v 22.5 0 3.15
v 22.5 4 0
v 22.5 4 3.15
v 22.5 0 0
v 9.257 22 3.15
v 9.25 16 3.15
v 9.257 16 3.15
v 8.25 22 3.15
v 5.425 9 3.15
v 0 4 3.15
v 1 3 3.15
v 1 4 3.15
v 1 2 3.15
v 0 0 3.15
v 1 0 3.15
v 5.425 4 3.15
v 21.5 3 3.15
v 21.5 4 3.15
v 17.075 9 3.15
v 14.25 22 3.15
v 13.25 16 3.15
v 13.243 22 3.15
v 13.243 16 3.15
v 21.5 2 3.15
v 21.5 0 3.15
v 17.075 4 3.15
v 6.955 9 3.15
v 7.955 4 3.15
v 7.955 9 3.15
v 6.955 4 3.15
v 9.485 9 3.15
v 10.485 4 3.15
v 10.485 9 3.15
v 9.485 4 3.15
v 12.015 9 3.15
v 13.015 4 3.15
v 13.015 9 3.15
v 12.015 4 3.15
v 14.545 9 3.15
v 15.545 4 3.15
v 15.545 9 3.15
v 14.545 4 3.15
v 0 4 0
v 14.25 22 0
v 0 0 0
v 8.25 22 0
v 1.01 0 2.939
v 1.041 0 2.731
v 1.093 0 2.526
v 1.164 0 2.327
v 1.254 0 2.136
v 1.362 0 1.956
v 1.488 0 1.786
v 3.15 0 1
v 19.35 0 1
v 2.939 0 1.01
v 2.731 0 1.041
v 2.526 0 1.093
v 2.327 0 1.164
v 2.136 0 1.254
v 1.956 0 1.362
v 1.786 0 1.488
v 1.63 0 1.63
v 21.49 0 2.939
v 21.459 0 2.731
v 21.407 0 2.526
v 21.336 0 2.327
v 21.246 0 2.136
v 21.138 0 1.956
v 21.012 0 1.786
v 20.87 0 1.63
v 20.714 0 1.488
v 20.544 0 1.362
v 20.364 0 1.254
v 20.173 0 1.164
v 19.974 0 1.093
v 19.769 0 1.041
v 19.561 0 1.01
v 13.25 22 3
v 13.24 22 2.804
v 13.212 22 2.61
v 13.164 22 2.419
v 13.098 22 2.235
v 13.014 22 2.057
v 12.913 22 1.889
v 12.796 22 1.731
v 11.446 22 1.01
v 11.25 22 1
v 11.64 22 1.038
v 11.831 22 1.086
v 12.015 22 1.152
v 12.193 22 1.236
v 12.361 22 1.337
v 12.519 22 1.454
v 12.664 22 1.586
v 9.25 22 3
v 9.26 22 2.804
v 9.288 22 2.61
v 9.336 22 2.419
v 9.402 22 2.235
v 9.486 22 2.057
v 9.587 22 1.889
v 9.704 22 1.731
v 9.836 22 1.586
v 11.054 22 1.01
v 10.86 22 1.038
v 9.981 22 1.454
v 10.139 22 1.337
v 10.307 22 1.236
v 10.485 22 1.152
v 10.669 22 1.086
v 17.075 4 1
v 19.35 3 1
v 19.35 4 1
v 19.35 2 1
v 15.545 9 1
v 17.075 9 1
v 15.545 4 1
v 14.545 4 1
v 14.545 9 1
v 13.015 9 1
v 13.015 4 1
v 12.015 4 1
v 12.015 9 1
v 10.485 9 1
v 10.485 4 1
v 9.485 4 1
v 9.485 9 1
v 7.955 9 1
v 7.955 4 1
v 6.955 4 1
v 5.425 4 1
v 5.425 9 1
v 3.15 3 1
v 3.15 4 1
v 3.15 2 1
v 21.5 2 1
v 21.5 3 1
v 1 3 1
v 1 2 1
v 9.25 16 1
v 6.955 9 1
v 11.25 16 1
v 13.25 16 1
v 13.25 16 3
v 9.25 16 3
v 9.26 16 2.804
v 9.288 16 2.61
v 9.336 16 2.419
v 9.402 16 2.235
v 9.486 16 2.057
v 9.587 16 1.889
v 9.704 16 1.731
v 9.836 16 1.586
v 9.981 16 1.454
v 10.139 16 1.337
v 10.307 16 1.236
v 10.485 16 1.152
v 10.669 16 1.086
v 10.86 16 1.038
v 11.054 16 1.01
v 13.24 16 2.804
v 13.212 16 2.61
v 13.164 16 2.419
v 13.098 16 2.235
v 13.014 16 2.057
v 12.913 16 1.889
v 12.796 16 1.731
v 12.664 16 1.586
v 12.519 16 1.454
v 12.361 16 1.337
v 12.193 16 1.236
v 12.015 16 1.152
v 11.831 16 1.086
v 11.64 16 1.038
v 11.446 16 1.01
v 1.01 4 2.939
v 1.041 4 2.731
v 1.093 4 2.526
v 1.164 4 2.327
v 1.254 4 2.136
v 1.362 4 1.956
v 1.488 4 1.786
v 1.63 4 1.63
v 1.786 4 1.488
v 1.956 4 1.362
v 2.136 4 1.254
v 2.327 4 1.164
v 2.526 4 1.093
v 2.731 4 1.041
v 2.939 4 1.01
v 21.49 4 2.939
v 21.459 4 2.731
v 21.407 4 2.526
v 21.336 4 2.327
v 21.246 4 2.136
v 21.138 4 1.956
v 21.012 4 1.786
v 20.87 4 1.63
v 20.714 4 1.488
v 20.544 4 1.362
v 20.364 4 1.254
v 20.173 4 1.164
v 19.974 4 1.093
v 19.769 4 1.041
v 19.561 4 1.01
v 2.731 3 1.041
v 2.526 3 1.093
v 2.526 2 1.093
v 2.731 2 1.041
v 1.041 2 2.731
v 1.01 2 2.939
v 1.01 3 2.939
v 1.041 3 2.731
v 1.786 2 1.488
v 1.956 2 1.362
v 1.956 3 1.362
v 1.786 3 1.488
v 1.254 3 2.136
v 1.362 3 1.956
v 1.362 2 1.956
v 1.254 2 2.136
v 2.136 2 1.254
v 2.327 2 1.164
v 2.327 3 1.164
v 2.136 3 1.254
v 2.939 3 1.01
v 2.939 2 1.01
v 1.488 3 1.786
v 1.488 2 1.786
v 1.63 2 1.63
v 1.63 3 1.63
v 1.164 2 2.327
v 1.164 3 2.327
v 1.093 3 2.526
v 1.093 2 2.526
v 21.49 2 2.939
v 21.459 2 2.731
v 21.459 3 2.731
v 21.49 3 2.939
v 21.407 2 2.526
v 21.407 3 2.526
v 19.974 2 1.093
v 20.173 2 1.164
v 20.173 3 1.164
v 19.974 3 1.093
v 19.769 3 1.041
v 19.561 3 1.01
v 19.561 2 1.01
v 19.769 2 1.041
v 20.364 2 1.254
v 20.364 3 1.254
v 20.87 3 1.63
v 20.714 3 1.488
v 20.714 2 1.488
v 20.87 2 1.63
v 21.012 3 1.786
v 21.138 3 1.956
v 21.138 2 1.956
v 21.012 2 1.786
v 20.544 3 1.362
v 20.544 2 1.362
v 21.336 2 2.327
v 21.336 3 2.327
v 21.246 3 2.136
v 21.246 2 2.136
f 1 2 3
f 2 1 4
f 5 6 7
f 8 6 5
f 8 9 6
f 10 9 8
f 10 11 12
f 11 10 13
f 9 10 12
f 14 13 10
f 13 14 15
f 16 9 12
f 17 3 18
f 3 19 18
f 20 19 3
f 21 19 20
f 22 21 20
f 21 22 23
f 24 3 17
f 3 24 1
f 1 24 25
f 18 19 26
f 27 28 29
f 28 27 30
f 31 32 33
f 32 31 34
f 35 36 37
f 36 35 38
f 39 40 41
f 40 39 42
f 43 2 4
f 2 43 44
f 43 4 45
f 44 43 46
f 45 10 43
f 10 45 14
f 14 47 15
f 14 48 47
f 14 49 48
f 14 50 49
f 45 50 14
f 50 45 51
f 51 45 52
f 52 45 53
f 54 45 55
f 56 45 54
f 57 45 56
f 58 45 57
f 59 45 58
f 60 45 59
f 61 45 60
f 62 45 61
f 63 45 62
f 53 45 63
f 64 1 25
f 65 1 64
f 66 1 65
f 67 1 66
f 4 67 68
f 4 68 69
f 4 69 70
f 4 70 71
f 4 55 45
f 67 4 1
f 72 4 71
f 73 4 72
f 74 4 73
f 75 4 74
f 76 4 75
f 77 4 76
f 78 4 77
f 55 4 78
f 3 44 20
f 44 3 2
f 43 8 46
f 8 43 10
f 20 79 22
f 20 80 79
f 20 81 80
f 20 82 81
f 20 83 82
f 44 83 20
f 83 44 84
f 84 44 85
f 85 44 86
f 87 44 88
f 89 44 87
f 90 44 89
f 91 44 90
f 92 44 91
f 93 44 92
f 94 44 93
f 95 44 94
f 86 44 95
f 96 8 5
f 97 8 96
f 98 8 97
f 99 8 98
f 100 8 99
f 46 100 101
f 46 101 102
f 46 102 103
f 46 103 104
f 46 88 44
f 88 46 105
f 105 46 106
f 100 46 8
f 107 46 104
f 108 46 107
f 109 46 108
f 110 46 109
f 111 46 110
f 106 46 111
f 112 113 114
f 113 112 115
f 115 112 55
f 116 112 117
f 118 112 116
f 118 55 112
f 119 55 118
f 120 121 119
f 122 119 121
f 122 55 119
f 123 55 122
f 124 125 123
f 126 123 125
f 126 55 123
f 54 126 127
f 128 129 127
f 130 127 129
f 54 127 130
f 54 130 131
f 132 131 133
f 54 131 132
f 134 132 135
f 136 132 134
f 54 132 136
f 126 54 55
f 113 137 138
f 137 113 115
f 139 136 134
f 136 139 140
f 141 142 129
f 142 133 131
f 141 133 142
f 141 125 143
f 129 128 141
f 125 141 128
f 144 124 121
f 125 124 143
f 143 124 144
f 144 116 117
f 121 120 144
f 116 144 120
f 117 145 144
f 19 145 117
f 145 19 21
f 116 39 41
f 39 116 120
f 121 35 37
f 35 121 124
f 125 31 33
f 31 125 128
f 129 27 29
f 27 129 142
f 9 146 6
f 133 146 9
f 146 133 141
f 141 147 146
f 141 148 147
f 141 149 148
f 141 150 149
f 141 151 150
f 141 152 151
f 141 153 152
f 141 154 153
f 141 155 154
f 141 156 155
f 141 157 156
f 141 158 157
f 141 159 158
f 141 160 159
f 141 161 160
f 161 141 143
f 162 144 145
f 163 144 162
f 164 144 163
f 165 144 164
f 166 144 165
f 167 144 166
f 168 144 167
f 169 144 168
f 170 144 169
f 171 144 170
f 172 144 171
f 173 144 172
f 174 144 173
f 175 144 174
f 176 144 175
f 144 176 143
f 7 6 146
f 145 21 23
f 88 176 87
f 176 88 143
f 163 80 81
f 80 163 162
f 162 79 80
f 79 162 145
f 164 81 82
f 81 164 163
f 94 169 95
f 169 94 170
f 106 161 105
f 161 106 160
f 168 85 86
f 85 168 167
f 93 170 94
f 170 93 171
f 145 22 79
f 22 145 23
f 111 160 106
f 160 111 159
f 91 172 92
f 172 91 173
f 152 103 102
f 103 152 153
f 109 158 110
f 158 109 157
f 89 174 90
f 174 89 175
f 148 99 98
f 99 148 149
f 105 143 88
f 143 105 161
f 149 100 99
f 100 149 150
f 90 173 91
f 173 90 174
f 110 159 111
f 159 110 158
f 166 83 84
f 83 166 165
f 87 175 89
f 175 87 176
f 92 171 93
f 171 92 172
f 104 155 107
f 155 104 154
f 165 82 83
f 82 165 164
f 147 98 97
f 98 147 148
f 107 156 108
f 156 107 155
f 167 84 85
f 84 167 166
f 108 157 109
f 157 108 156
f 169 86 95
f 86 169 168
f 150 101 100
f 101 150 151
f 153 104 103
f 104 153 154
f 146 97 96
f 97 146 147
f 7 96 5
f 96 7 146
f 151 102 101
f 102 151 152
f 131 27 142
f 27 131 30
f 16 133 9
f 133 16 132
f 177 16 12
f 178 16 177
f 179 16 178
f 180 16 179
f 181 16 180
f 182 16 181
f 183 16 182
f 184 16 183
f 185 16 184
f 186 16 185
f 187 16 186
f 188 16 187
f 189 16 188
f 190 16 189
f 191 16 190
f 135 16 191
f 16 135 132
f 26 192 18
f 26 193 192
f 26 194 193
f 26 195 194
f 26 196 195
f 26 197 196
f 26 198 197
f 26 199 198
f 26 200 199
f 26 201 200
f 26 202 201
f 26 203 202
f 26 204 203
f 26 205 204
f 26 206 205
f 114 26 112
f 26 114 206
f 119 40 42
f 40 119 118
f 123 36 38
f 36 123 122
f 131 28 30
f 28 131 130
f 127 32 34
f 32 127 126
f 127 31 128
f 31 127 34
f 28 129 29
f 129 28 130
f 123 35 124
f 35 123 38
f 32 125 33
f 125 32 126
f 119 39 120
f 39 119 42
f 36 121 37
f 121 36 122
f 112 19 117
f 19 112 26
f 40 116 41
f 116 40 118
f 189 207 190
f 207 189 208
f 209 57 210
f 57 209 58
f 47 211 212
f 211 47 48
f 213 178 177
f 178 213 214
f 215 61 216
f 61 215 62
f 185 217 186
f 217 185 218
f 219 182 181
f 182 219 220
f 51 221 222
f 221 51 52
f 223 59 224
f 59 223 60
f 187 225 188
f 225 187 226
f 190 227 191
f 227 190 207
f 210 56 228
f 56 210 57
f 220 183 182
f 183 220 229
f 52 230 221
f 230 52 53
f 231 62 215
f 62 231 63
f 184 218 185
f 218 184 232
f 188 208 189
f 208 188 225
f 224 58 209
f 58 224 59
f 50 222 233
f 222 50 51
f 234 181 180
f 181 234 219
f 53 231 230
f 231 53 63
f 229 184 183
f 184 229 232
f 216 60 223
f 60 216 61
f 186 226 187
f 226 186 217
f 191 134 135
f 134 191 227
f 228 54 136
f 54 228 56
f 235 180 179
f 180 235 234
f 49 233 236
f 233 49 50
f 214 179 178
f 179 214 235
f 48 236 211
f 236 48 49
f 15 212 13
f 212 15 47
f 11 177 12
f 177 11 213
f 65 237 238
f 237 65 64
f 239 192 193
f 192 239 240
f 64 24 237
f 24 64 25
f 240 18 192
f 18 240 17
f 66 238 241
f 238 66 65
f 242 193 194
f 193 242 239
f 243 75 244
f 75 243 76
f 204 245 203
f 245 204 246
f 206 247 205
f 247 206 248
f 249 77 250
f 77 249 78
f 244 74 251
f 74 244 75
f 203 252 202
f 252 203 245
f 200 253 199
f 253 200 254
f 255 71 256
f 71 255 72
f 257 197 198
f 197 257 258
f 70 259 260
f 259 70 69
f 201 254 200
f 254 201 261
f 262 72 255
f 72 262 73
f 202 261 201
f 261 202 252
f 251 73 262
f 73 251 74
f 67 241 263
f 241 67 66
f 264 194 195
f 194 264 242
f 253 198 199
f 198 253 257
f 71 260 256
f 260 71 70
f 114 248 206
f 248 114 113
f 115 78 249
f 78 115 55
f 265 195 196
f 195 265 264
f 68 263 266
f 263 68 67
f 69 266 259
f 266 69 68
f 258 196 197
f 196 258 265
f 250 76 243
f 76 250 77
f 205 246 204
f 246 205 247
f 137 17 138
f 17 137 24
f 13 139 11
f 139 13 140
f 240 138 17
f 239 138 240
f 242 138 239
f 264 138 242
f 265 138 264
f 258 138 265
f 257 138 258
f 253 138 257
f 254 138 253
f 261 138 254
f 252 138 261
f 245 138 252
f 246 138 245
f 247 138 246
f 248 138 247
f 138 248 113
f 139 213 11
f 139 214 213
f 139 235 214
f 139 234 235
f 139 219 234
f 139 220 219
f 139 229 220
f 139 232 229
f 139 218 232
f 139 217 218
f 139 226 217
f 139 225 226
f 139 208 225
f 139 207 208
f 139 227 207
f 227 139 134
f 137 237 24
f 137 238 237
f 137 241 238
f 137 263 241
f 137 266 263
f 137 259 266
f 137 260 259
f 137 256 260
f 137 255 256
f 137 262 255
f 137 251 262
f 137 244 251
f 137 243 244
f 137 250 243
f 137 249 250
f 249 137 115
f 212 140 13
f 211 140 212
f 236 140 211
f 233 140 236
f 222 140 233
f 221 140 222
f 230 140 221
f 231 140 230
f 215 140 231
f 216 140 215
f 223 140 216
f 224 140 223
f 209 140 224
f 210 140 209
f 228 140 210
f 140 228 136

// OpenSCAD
$fn = 64;

thickness = 1;

cable_r = 2;
wire_d = 1.5;
pin_d = 0.77;
pin_pitch = 3.3 - pin_d;
channel_w = pin_pitch - 1;
channel_l = 5;
connector_h = 4.3;
connector_w = 20.5;
connector_l = 4;
connector_tab = 1;

housing_h = connector_h + 2 * thickness;
housing_w = connector_w + 2 * thickness;
housing_cavity_l = 13;
housing_l = 18;


module channel() {
  cube([
    channel_w,
    channel_l,
    connector_h,
  ]);
}

module connector() {
  // Main body
  translate([
    connector_h / 2,
    0,
    0,
  ]) cube([
    connector_w - connector_h,
    connector_l,
    connector_h,
  ]);
  // Rounded Ends
  r=connector_h / 2;
  translate([r, 0, r]) rotate([-90, 0, 0]) cylinder(r=r, h=connector_l);
  translate([connector_w - r, 0, r]) rotate([-90, 0, 0]) cylinder(r=r, h=connector_l);
  // Rectangular tab
  translate([
    0, 2, 0
  ]) cube([
    connector_w,
    connector_tab,
    connector_h,
  ]);
  // Wire/pin channels
  for (i = [-2:2]) {
    translate([
      (connector_w - channel_w) / 2 + (pin_pitch * i),
      connector_l,
      0,
    ]) channel();
  }
}


module cable() {
  translate([cable_r, 0, cable_r]) rotate([-90, 0, 0]) cylinder(r=cable_r, h=50);
}


module housing() {
  difference() {
    union() {
      // Connector area
      cube([
        housing_w,
        connector_l,
        housing_h / 2,
      ]);
      // Wire to cable port
      translate([0, connector_l, 0]) linear_extrude(housing_h / 2)
        polygon([
          [0, 0],
          [housing_w, 0],
          [housing_w / 2 + cable_r + thickness, housing_l],
          [housing_w / 2 - cable_r - thickness, housing_l],
        ]);
    }
    pin_dx = (housing_w - channel_w) / 2 - (pin_pitch * 2);
    translate([0, connector_l + channel_l, thickness]) linear_extrude(housing_h)
      polygon([
        [pin_dx, 0],
        [housing_w - pin_dx, 0],
        [housing_w / 2 + cable_r, housing_cavity_l - channel_l - thickness],
        [housing_w / 2 - cable_r, housing_cavity_l - channel_l - thickness],
      ]);
    // Cable port
    translate([housing_w / 2 - cable_r, housing_l - 2 * thickness, thickness]) cable();
  }
}


difference() {
  housing();
  translate([thickness, 0, thickness]) connector();
}
